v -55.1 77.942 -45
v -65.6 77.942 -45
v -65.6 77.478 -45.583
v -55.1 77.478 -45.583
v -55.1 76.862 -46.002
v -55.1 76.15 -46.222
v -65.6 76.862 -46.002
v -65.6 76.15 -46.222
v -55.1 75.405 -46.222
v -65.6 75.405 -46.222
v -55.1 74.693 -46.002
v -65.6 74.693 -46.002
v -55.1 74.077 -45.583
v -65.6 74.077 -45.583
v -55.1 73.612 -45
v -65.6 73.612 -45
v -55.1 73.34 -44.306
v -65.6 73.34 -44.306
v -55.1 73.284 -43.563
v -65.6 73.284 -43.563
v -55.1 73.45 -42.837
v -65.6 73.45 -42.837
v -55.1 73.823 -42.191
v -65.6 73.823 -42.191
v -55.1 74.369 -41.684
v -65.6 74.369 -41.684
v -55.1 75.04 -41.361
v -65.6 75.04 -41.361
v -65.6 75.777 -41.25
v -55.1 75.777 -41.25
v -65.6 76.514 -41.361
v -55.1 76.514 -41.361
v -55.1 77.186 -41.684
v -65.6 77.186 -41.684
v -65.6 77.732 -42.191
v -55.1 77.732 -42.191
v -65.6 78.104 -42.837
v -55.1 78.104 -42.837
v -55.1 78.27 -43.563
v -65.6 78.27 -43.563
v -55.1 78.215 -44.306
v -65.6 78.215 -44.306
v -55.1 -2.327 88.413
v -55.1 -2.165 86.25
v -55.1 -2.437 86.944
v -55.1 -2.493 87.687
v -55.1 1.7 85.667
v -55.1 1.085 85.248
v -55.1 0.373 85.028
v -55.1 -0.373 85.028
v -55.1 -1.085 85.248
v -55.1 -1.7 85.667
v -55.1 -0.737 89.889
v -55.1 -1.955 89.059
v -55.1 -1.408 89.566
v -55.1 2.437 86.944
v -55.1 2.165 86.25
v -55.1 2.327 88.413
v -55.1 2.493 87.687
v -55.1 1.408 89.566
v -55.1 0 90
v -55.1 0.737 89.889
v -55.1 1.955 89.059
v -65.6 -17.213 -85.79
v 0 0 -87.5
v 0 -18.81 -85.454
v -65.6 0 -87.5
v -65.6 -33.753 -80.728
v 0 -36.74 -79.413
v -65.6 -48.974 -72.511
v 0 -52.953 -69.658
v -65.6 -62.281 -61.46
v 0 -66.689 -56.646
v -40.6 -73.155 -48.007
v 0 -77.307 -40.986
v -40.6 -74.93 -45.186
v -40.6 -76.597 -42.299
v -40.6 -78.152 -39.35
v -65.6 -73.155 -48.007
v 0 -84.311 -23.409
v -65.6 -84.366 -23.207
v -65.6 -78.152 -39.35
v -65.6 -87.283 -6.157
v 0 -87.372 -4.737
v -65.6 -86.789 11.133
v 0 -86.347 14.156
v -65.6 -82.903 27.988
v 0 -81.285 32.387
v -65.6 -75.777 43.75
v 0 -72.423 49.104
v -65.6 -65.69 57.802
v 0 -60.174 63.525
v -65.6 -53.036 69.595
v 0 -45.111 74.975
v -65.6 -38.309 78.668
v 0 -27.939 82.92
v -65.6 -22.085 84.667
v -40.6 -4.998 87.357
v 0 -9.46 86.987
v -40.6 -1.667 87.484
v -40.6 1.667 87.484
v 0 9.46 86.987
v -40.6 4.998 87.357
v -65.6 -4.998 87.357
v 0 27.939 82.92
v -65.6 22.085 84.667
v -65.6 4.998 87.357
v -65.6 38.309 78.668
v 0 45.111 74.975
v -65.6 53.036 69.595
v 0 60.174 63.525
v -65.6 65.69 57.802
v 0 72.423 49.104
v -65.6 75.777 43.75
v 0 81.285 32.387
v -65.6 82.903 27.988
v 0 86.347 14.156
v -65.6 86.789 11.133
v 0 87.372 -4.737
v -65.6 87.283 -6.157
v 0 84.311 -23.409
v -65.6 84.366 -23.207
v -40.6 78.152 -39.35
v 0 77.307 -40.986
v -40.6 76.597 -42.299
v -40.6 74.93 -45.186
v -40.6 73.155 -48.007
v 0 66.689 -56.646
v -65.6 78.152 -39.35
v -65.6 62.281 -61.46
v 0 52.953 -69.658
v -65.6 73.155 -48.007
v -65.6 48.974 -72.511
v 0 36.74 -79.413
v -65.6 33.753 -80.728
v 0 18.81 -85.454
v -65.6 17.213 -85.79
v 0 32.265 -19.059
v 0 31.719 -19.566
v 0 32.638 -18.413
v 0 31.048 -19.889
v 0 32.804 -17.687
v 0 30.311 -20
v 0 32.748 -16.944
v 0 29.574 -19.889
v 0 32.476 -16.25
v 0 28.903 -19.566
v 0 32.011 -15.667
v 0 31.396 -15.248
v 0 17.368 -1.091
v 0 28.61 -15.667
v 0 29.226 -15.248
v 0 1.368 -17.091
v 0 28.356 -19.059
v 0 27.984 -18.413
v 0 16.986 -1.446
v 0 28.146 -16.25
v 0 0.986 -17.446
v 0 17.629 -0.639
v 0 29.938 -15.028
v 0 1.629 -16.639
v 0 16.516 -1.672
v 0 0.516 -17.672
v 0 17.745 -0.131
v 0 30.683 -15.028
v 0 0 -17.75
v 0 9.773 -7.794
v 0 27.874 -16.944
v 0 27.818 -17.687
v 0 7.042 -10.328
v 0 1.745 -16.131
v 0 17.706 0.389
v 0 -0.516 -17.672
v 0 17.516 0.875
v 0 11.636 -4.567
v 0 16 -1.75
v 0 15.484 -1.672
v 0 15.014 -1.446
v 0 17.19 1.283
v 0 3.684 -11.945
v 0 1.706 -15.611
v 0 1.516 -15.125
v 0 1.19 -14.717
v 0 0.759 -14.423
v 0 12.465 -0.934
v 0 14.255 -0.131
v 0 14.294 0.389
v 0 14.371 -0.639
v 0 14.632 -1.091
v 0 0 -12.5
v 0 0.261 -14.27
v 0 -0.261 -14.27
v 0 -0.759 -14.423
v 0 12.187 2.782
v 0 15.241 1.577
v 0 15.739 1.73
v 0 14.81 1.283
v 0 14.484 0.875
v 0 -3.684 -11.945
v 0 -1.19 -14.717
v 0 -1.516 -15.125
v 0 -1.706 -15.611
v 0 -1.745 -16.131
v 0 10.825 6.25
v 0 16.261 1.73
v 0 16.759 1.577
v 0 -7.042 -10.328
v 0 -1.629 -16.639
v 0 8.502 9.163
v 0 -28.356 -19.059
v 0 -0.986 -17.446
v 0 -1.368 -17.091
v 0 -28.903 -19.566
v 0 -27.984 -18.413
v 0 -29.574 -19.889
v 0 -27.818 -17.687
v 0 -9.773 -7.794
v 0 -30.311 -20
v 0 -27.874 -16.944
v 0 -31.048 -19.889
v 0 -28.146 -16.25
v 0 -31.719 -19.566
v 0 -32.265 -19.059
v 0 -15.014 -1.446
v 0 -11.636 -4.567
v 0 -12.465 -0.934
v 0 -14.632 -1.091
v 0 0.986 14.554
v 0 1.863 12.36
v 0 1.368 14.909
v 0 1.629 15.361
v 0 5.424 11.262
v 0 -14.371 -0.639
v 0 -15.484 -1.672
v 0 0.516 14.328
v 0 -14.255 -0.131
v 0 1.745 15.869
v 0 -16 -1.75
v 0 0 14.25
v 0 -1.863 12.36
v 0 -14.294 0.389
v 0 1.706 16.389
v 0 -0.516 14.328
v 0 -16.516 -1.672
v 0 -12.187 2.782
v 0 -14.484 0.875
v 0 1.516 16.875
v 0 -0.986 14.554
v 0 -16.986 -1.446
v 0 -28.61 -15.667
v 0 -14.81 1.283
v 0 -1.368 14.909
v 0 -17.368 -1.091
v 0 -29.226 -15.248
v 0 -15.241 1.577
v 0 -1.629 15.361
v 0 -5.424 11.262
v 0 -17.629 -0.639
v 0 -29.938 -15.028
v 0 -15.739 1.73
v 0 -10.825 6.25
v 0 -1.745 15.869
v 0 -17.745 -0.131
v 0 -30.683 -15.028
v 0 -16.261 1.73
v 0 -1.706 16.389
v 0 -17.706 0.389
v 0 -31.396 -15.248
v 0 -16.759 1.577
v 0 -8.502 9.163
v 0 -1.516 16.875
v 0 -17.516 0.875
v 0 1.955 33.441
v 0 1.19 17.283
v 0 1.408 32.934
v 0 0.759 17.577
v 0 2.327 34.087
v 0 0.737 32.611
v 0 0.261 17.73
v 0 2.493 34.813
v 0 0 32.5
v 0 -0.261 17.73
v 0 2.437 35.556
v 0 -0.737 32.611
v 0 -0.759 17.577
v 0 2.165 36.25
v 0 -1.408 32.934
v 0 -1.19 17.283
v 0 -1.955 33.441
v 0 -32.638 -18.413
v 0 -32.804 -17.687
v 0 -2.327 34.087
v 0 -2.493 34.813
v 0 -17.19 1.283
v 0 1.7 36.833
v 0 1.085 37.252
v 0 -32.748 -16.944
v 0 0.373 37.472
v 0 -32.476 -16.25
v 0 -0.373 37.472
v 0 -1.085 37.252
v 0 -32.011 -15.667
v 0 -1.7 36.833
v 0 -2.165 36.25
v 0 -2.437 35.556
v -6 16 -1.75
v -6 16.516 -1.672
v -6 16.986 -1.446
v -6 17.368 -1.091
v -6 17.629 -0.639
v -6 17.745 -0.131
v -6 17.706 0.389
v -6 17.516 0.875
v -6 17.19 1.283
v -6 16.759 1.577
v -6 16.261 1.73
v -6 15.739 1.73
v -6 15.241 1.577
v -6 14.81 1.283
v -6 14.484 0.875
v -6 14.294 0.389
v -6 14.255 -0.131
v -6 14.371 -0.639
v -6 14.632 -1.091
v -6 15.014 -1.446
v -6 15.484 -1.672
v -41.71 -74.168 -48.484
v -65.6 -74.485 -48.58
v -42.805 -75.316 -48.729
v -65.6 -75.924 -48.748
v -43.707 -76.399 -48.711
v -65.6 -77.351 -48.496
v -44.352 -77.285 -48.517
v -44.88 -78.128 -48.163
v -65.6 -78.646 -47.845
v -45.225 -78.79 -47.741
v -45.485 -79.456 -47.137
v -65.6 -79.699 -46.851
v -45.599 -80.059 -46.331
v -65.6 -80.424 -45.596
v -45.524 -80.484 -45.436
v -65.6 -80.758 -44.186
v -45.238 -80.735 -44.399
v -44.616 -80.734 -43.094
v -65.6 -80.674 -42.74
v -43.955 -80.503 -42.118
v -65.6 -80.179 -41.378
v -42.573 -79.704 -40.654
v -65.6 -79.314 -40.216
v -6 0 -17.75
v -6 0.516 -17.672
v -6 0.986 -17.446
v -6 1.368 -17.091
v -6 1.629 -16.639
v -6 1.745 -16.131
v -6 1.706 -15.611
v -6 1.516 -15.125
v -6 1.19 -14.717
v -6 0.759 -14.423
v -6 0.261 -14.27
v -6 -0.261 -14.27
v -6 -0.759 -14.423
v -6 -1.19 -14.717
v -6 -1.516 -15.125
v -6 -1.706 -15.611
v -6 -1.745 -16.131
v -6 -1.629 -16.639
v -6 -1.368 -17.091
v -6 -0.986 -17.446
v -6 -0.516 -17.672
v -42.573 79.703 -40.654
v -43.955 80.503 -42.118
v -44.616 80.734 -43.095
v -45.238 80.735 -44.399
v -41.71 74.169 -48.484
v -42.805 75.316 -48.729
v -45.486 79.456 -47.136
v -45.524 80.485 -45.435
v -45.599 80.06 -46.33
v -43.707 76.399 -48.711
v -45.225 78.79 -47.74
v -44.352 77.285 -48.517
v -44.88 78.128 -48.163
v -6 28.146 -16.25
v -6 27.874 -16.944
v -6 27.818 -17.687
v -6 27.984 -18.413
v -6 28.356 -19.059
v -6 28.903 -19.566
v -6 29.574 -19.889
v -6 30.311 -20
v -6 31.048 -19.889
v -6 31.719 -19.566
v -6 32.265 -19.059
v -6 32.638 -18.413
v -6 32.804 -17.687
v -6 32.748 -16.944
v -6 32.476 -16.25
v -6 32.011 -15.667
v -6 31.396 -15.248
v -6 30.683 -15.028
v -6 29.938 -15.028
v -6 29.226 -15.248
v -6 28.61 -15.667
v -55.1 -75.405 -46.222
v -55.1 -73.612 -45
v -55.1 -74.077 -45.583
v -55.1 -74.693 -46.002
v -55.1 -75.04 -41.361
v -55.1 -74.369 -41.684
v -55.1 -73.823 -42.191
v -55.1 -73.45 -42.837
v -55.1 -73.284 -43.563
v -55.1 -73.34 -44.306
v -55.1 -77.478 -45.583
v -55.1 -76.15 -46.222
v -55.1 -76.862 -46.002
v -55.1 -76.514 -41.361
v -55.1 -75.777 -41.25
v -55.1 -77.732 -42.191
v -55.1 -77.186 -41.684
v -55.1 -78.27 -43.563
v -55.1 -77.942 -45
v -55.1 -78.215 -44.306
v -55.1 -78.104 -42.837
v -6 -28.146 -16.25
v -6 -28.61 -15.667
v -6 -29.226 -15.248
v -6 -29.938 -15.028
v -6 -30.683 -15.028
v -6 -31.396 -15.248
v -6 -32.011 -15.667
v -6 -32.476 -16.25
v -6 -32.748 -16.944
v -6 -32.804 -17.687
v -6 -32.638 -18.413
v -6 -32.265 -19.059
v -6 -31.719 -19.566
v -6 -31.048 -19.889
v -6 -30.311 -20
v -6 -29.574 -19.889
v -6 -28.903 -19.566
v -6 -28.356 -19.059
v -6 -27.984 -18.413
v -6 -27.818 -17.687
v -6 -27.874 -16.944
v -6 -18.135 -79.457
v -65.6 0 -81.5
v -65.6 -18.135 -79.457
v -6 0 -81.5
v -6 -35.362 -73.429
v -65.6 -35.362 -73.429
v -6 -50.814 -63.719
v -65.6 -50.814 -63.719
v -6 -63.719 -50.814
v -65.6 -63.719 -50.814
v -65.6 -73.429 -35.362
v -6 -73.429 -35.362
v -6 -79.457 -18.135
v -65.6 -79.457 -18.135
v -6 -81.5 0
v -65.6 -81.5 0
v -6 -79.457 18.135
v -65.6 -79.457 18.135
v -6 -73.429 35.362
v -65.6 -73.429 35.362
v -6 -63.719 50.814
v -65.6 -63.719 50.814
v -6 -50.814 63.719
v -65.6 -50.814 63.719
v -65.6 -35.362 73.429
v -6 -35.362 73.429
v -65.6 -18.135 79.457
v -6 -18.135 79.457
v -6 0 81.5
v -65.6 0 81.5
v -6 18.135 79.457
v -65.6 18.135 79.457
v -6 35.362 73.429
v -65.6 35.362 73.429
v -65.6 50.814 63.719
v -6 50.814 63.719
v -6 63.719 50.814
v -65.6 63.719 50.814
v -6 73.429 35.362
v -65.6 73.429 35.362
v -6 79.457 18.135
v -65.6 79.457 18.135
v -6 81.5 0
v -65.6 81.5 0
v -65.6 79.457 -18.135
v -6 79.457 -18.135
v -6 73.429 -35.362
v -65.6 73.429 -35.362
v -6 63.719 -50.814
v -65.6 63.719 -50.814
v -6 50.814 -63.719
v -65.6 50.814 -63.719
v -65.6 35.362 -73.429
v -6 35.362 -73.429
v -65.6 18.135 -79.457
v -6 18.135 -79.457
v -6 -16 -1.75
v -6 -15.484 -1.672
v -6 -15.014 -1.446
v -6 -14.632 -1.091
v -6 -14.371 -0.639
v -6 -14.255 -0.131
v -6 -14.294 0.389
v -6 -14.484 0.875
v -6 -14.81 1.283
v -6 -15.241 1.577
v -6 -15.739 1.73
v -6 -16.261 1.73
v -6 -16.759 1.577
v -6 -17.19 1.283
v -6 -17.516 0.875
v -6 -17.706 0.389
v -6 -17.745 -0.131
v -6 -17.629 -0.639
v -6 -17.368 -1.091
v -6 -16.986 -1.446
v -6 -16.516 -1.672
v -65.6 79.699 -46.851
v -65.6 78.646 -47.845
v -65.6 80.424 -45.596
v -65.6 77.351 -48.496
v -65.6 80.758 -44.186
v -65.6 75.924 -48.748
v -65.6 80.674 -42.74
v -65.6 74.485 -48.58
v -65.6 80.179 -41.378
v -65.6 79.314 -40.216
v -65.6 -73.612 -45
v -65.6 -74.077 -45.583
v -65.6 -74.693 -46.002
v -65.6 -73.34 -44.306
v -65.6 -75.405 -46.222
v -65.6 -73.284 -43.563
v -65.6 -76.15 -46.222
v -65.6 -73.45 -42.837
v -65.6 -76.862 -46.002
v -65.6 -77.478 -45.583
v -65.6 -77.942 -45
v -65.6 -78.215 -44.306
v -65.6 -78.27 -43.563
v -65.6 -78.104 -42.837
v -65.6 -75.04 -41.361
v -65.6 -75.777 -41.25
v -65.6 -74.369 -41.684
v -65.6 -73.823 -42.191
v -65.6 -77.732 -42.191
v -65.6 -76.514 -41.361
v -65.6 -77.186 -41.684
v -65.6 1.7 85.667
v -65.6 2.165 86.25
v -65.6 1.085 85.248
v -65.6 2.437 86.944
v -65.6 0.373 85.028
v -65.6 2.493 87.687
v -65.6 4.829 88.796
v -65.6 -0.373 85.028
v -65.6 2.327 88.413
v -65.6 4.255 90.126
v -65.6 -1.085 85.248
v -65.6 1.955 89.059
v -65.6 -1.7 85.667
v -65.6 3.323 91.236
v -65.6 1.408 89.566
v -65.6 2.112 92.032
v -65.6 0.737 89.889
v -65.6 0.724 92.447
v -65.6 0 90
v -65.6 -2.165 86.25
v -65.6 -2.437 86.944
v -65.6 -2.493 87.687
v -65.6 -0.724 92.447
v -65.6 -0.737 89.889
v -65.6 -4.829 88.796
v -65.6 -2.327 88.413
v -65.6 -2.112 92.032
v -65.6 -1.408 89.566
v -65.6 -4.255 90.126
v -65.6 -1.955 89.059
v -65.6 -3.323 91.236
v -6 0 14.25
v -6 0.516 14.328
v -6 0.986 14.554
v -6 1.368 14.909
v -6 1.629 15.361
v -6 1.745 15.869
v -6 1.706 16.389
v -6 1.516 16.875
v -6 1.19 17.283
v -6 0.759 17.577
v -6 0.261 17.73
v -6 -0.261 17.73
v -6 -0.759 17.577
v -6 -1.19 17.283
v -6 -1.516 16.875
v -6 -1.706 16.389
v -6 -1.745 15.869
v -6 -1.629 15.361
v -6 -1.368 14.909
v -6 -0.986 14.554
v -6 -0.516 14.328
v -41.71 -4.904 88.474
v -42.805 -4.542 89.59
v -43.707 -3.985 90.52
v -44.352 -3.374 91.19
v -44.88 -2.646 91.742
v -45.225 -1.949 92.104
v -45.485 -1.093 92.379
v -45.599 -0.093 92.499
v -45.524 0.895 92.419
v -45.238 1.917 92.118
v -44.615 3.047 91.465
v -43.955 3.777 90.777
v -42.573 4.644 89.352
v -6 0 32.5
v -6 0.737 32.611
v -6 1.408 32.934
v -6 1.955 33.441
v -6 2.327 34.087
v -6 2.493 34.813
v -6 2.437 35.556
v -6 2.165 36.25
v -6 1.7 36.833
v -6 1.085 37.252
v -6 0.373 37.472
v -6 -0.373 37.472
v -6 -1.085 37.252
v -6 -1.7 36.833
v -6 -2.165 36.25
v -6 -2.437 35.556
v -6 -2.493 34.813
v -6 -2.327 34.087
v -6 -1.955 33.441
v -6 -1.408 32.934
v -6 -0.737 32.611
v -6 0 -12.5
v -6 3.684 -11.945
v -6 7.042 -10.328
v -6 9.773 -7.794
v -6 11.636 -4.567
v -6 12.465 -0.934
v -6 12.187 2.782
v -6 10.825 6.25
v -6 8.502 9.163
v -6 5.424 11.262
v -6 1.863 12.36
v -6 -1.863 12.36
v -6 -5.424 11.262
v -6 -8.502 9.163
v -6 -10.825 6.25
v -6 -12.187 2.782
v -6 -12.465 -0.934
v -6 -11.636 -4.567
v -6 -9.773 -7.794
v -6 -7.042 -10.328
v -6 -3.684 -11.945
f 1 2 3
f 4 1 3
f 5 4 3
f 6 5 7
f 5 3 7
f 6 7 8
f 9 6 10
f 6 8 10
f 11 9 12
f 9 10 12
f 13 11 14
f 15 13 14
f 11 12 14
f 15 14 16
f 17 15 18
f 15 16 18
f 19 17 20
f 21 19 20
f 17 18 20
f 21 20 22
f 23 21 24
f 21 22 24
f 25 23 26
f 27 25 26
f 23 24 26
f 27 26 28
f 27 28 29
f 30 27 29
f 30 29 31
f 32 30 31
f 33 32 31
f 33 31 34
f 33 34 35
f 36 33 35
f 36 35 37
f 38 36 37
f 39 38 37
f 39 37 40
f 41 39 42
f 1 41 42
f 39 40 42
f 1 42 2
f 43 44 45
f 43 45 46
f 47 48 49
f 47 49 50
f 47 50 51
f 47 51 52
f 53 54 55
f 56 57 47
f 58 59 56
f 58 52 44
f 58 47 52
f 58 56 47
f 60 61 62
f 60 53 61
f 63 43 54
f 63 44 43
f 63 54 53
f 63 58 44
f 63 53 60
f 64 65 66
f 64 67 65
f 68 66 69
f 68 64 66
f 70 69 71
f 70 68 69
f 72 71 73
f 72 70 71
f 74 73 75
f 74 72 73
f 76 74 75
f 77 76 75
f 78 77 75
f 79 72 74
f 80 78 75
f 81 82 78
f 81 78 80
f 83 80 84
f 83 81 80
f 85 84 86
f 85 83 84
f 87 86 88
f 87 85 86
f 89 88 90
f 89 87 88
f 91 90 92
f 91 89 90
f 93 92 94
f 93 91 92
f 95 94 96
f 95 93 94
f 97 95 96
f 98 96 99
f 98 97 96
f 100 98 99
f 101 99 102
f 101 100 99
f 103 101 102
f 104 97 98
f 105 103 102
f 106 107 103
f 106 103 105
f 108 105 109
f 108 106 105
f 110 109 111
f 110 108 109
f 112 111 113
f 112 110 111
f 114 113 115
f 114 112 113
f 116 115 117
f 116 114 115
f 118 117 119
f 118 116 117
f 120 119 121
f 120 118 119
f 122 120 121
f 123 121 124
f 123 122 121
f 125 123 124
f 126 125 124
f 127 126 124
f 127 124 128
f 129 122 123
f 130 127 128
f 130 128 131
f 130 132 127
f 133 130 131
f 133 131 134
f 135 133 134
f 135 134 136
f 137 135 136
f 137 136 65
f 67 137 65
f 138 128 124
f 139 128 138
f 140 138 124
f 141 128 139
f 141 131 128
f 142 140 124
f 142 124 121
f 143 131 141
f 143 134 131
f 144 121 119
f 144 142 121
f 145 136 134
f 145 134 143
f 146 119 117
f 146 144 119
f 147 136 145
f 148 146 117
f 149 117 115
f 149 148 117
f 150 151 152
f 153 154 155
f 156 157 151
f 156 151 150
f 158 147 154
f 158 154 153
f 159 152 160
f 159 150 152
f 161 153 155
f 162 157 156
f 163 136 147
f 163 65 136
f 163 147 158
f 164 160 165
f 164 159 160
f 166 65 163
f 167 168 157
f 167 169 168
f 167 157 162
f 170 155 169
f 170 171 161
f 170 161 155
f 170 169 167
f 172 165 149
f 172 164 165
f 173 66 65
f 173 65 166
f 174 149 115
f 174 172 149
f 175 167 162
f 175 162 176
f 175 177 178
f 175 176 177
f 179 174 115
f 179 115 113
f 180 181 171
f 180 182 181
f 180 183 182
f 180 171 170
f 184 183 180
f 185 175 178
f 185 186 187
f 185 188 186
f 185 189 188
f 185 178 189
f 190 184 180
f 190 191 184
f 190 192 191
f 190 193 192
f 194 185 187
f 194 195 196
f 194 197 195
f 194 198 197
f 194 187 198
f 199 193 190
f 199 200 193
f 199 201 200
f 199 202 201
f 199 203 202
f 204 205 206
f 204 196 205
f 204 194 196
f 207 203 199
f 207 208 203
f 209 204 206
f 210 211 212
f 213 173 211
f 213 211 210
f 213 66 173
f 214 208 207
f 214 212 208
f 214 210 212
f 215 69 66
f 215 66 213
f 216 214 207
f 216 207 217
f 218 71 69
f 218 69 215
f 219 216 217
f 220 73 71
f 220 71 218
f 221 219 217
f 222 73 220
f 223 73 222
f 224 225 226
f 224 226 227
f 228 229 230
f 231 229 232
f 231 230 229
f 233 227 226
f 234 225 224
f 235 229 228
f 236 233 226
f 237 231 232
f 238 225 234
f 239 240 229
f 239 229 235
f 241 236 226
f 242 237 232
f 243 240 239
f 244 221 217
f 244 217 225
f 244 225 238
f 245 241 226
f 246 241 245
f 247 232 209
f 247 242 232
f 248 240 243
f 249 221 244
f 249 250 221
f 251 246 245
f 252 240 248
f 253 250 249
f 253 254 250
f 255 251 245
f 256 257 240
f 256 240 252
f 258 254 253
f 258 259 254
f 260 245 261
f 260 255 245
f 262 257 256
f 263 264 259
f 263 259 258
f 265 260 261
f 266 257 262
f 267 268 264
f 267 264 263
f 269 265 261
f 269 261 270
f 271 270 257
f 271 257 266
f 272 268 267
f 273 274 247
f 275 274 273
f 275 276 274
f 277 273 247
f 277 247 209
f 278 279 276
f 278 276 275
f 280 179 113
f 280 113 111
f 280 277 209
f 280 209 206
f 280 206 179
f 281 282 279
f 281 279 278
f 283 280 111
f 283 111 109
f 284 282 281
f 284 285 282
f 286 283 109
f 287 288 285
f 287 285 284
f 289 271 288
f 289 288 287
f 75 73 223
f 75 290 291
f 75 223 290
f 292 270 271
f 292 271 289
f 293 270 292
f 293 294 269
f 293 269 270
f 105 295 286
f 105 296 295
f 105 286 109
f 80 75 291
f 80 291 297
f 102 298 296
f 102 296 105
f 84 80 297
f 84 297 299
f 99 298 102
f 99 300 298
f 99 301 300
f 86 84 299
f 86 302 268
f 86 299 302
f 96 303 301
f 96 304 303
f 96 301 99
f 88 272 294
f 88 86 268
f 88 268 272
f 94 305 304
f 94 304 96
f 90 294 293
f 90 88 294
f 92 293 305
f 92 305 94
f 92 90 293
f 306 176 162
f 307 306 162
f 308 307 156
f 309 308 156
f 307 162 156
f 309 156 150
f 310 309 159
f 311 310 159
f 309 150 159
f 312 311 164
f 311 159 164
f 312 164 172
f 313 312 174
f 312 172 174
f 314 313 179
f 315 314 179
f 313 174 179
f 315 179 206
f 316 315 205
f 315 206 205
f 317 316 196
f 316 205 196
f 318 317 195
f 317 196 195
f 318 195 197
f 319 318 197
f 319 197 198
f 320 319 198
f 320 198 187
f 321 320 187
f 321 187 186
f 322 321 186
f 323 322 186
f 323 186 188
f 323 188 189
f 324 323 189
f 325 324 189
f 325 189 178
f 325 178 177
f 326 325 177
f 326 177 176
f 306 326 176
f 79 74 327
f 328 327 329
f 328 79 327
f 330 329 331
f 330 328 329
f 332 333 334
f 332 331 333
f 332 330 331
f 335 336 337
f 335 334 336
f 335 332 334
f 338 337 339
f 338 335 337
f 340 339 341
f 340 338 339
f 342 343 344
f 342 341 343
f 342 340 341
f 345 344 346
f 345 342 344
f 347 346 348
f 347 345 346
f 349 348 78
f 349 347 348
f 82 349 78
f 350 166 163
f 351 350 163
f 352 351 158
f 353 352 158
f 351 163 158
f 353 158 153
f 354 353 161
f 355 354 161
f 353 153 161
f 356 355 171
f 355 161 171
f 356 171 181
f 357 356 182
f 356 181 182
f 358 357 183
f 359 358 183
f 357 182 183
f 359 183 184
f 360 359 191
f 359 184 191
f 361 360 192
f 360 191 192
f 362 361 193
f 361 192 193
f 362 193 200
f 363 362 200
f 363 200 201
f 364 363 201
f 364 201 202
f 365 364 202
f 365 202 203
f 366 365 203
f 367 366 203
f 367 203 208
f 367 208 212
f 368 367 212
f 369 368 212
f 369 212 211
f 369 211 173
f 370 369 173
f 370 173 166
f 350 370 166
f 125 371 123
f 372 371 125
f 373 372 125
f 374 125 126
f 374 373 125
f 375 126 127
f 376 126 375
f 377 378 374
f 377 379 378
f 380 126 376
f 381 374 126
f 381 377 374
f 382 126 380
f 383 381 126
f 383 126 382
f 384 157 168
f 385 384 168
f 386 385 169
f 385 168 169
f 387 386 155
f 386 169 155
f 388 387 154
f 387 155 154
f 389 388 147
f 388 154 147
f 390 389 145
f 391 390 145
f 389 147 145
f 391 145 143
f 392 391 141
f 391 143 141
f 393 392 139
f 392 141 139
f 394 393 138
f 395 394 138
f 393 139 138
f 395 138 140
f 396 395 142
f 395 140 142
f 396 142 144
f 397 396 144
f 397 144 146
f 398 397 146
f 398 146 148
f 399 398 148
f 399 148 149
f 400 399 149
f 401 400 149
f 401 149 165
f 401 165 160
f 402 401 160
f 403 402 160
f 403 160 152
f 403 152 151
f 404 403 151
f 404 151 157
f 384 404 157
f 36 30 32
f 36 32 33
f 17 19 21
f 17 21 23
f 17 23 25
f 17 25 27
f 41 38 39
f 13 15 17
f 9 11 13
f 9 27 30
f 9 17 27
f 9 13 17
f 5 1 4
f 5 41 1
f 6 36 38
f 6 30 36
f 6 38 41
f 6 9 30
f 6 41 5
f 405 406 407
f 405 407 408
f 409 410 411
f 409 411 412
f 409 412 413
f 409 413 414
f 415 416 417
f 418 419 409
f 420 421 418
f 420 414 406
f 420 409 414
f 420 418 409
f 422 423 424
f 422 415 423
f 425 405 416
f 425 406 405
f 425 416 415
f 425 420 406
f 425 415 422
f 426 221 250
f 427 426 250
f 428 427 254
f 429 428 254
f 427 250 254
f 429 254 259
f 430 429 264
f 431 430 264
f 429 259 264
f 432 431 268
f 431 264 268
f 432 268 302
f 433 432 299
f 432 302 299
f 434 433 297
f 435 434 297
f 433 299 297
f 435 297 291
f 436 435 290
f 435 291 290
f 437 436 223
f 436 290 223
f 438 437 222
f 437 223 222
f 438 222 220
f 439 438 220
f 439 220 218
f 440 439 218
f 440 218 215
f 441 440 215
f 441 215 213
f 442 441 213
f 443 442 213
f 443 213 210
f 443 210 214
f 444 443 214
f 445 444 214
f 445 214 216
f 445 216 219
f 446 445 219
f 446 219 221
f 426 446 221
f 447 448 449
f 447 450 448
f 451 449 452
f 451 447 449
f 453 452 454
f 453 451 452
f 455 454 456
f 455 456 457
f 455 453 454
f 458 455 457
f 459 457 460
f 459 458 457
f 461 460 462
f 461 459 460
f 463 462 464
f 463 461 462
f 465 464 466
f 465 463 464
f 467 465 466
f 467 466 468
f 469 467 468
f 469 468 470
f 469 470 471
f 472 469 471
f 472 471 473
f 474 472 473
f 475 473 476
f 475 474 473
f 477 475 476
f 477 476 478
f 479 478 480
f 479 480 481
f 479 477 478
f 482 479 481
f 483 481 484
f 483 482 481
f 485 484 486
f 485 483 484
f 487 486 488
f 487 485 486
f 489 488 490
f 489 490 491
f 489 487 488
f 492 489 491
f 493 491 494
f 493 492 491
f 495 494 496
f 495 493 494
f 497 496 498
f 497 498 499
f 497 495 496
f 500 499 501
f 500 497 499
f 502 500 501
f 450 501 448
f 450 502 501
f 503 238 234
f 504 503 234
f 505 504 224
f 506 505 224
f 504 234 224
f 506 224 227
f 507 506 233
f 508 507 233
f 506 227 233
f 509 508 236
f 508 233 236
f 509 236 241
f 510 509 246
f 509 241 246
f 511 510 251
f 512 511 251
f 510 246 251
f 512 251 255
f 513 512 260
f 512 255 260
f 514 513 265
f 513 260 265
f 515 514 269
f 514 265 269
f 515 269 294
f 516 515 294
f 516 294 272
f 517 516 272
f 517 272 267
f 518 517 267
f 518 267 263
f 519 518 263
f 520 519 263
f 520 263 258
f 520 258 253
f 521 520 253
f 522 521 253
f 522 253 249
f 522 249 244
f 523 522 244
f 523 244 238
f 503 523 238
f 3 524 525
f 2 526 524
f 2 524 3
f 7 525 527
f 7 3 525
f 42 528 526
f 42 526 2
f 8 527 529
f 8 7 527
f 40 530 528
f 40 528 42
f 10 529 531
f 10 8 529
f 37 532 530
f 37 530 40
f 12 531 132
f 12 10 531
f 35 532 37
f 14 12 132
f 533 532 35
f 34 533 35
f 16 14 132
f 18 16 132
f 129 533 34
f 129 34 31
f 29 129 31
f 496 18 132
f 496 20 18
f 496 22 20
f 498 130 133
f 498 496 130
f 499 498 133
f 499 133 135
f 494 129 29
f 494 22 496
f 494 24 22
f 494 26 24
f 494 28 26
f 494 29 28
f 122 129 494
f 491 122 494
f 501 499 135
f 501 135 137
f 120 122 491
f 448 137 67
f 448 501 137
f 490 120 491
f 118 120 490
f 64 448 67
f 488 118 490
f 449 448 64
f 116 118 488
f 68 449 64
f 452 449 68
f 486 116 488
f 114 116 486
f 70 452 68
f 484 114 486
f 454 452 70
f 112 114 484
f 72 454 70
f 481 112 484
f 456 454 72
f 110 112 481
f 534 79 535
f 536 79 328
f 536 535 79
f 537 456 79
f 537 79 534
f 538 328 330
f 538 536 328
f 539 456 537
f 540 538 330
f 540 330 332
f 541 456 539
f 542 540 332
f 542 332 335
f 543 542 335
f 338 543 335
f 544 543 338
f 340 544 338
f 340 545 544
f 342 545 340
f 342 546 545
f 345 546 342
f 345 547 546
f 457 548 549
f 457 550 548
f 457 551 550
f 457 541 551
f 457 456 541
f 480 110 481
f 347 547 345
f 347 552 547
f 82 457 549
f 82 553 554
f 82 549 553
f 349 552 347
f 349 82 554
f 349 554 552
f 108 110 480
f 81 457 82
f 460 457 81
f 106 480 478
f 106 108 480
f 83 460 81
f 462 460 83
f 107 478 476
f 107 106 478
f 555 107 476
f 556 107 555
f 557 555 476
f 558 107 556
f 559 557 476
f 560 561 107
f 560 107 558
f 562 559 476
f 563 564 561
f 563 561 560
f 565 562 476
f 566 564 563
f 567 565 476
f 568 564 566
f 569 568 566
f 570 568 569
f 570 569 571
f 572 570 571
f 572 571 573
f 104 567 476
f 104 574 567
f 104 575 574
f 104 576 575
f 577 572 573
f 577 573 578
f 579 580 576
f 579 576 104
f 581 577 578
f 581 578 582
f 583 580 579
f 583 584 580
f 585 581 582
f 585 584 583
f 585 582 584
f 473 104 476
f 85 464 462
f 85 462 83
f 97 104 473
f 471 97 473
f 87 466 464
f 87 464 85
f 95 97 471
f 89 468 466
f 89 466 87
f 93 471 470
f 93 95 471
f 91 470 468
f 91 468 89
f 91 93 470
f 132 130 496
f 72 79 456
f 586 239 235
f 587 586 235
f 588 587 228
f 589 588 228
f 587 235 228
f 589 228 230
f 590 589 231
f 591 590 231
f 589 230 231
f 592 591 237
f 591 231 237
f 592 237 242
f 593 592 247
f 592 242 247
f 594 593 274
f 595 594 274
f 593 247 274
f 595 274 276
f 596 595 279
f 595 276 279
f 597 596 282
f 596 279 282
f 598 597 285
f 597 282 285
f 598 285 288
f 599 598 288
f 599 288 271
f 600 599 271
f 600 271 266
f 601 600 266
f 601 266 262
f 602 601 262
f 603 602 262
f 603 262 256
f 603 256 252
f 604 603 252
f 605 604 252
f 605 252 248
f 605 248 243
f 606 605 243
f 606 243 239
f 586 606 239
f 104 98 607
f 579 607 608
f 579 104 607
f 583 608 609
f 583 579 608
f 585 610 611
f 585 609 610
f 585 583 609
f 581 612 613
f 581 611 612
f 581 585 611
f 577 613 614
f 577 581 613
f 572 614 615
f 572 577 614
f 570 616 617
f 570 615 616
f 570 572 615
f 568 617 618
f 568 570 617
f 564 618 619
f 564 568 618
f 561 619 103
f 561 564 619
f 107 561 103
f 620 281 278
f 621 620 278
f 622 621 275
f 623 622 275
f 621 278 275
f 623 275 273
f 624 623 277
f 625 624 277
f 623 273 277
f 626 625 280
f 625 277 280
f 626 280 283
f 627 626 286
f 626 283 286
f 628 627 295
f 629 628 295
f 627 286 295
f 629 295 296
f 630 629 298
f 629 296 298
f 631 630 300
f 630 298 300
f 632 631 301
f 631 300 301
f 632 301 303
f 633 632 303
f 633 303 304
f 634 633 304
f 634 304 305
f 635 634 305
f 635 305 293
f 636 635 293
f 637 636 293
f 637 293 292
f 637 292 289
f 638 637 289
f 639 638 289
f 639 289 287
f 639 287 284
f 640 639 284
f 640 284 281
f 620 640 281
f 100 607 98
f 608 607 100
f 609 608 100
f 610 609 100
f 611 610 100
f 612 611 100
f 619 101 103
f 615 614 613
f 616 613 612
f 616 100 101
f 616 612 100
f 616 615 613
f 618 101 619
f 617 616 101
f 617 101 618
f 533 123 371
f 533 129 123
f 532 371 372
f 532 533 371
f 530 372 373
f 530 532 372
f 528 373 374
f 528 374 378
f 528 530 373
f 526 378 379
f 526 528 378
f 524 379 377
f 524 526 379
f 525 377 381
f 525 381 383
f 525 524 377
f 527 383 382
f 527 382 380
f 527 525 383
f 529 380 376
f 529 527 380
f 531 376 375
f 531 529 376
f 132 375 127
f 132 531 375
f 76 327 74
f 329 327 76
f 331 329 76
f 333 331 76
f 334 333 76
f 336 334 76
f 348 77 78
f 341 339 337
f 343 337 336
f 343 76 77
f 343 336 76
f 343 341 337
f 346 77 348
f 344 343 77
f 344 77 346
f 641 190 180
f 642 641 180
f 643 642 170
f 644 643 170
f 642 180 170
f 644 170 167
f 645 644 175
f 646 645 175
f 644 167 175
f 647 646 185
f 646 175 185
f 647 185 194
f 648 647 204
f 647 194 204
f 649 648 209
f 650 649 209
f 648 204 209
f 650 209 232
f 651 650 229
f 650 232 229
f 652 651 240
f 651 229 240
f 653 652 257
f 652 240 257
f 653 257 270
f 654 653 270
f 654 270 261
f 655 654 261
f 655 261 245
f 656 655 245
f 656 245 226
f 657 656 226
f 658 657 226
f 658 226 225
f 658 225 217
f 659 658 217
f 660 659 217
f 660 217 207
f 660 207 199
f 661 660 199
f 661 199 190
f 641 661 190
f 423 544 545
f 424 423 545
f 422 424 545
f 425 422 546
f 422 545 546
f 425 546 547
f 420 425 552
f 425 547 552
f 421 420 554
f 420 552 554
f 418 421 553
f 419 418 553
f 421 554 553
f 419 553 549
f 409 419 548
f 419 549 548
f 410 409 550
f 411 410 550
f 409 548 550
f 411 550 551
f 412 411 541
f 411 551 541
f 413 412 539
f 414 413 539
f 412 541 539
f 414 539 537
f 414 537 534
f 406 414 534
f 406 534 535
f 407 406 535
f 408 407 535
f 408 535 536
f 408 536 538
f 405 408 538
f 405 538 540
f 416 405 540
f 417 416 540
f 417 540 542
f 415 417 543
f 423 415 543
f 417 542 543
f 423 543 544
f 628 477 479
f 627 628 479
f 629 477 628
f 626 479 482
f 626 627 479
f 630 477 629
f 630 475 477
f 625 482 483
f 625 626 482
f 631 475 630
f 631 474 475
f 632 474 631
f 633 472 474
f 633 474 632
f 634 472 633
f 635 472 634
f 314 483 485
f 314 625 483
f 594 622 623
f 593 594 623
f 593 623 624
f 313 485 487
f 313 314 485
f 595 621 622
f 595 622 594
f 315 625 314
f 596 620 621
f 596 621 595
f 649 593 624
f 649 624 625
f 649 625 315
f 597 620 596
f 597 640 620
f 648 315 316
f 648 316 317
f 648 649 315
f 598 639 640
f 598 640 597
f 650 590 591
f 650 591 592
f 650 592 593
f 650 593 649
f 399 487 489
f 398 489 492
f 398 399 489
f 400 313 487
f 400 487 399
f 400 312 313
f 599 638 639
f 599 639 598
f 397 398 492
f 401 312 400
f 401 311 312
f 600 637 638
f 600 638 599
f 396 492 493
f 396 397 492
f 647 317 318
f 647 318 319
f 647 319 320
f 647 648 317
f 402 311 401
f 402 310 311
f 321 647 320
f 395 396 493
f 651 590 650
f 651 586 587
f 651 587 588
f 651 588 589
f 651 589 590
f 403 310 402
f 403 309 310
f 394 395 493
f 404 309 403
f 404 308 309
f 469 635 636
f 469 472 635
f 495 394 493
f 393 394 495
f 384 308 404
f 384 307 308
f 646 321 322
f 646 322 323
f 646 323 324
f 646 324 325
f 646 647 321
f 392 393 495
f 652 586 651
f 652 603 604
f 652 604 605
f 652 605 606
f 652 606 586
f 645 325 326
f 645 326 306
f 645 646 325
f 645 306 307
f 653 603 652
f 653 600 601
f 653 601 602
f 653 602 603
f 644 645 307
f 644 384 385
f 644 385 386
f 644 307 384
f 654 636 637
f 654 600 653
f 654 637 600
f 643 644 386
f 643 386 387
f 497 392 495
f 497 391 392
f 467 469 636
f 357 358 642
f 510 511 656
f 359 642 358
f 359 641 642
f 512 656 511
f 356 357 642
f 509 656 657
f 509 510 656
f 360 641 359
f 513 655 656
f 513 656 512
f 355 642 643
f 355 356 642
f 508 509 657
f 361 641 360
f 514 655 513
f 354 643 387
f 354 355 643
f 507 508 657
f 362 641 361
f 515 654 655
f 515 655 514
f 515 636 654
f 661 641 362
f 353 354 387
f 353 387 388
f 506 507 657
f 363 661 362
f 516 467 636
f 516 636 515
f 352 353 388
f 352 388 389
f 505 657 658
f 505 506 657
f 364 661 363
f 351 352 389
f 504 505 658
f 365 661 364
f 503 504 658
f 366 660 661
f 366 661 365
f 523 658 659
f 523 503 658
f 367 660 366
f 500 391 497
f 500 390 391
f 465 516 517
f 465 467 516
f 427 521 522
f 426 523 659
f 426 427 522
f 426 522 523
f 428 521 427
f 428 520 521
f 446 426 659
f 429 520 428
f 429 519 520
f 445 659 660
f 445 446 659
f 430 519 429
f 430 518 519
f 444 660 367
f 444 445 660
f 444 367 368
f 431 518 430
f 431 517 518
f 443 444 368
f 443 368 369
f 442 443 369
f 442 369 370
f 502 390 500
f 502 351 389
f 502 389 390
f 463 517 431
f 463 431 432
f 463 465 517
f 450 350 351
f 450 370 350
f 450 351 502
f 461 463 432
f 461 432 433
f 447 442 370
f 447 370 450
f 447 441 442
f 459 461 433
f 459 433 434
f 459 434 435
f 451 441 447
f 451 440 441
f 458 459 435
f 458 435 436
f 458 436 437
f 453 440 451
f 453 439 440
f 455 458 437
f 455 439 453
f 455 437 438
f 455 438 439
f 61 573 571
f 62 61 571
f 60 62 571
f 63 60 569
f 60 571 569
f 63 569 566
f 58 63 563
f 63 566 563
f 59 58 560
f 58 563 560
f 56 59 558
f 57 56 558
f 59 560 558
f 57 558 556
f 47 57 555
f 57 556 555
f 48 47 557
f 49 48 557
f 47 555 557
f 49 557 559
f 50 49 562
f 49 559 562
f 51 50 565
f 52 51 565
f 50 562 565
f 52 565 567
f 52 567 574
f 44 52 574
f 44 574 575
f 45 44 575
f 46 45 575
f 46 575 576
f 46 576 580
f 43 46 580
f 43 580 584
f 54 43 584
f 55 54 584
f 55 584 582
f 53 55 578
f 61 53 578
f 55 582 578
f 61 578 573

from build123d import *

# Parameters (mm, degrees)
SKETCH3_R           = 12.5
CUT_EXTRUDE2_DEPTH  = 30
SKETCH4_R           = 5
BOSS_EXTRUDE1_DEPTH = 15
SKETCH5_R           = 2.5
CUT_EXTRUDE3_DEPTH  = 10.5
CIRPATTERN1_COUNT   = 3
CHAMFER1_SIZE       = 10
CHAMFER2_SIZE       = 10
CHAMFER3_SIZE       = 10
SKETCH6_R           = 1.75
CUT_EXTRUDE4_DEPTH  = 10.5
SKETCH7_R           = 2.5
CUT_EXTRUDE5_DEPTH  = 10.5
CIRPATTERN2_COUNT   = 3


with BuildPart() as part:
    # Sketch1 → Revolve1 (revolve)
    with BuildSketch(Plane(origin=(0, 0, 0), x_dir=(-1, 0, 0), z_dir=(0, 1, 0)), mode=Mode.PRIVATE) as revolve1_sk:
        Polygon((0, 0), (0, 87.5), (65.6, 87.5), (65.6, 81.5), (6, 81.5), (6, 0), align=None)
    revolve(revolve1_sk.sketch.rotate(Axis((38.11091851, 0, 0), (-1, 0, 0)), 180), axis=Axis((38.11091851, 0, 0), (-1, 0, 0)))

    # Sketch3 → Cut-Extrude2 (cut)
    with BuildSketch(Plane.YZ):
        with Locations(Location((0, 0, 0), (0, 0, 270))):
            Circle(SKETCH3_R)
    extrude(amount=-CUT_EXTRUDE2_DEPTH, mode=Mode.SUBTRACT)

    # Sketch4 → Boss-Extrude1 (add)
    with BuildSketch(Plane(origin=(-65.6, 0, 0), x_dir=(0, -1, 0), z_dir=(-1, 0, 0))):
        with Locations((0, 87.5)):
            Circle(SKETCH4_R)
        with Locations((-75.777222831, -43.75)):
            Circle(SKETCH4_R)
        with Locations((75.777222831, -43.75)):
            Circle(SKETCH4_R)
    extrude(amount=-BOSS_EXTRUDE1_DEPTH)

    # Sketch5 → Cut-Extrude3 (cut)
    with BuildSketch(Plane(origin=(-65.6, 0, 0), x_dir=(0, -1, 0), z_dir=(-1, 0, 0))):
        with Locations(Location((0, 87.5, 0), (0, 0, 90))):
            Circle(SKETCH5_R)
    cut_extrude3 = extrude(amount=-CUT_EXTRUDE3_DEPTH, mode=Mode.SUBTRACT)

    # CirPattern1: Cut-Extrude3 ×3 about axis
    cirpattern1_axis = Axis((0, 0, 0), (1, 0, 0))
    for i in range(1, CIRPATTERN1_COUNT):
        add(cut_extrude3.rotate(cirpattern1_axis, i * 360 / CIRPATTERN1_COUNT), mode=Mode.SUBTRACT)

    # Chamfer1
    # the kernel refuses this chamfer: 10 mm, written as the material it adds along each edge
    with BuildSketch(Plane(origin=(-50.6, 0, 0), x_dir=(0, 0.9851517122975438, -0.17168606162766187), z_dir=(0, 0.17168606162766187, 0.9851517122975438))) as chamfer1_piece_1_section:
        Polygon((87.5, -CHAMFER1_SIZE), (87.5 + CHAMFER1_SIZE, 0), (87.5, 0), align=None)
    chamfer1_piece_1 = revolve(axis=Axis((-50.6, 0, 0), (-1, 0, 0)), revolution_arc=40.228270546, mode=Mode.PRIVATE)
    chamfer1_piece_1 = chamfer1_piece_1 & Plane(origin=(-46.494939835, 75.777222831, -43.75), x_dir=(0, -1, 0), z_dir=(-1, 0, 0)) * Cylinder(5, 390, mode=Mode.PRIVATE)
    add(chamfer1_piece_1)

    # Chamfer2
    # the kernel refuses this chamfer: 10 mm, written as the material it adds along each edge
    with BuildSketch(Plane(origin=(-50.6, 0, 0), x_dir=(0, -0.3438913653035208, 0.9390094402452408), z_dir=(0, -0.9390094402452408, -0.3438913653035208))) as chamfer2_piece_1_section:
        Polygon((87.5, -CHAMFER2_SIZE), (87.5 + CHAMFER2_SIZE, 0), (87.5, 0), align=None)
    chamfer2_piece_1 = revolve(axis=Axis((-50.6, 0, 0), (-1, 0, 0)), revolution_arc=40.228270546, mode=Mode.PRIVATE)
    chamfer2_piece_1 = chamfer2_piece_1 & Plane(origin=(-46.494939444, 0, 87.5), x_dir=(0, -1, 0), z_dir=(-1, 0, 0)) * Cylinder(5, 390, mode=Mode.PRIVATE)
    add(chamfer2_piece_1)

    # Chamfer3
    # the kernel refuses this chamfer: 10 mm, written as the material it adds along each edge
    with BuildSketch(Plane(origin=(-50.6, 0, 0), x_dir=(0, -0.6412603469940208, -0.7673233786175866), z_dir=(0, 0.7673233786175866, -0.6412603469940208))) as chamfer3_piece_1_section:
        Polygon((87.5, -CHAMFER3_SIZE), (87.5 + CHAMFER3_SIZE, 0), (87.5, 0), align=None)
    chamfer3_piece_1 = revolve(axis=Axis((-50.6, 0, 0), (-1, 0, 0)), revolution_arc=40.228270546, mode=Mode.PRIVATE)
    chamfer3_piece_1 = chamfer3_piece_1 & Plane(origin=(-46.494939164, -75.777222831, -43.75), x_dir=(0, -1, 0), z_dir=(-1, 0, 0)) * Cylinder(5, 390, mode=Mode.PRIVATE)
    add(chamfer3_piece_1)

    # Sketch6 → Cut-Extrude4 (cut)
    with BuildSketch(Plane.YZ):
        with Locations(Location((-16, 0, 0), (0, 0, 270))):
            Circle(SKETCH6_R)
        with Locations(Location((16, 0, 0), (0, 0, 270))):
            Circle(SKETCH6_R)
        with Locations(Location((0, 16, 0), (0, 0, 270))):
            Circle(SKETCH6_R)
        with Locations(Location((0, -16, 0), (0, 0, 270))):
            Circle(SKETCH6_R)
    extrude(amount=-CUT_EXTRUDE4_DEPTH, mode=Mode.SUBTRACT)

    # Sketch7 → Cut-Extrude5 (cut)
    with BuildSketch(Plane.YZ):
        with Locations(Location((0, 35, 0), (0, 0, 270))):
            Circle(SKETCH7_R)
    cut_extrude5 = extrude(amount=-CUT_EXTRUDE5_DEPTH, mode=Mode.SUBTRACT)

    # CirPattern2: Cut-Extrude5 ×3 about axis
    cirpattern2_axis = Axis((0, 0, 0), (1, 0, 0))
    for i in range(1, CIRPATTERN2_COUNT):
        add(cut_extrude5.rotate(cirpattern2_axis, i * 360 / CIRPATTERN2_COUNT), mode=Mode.SUBTRACT)


solid = part.part
